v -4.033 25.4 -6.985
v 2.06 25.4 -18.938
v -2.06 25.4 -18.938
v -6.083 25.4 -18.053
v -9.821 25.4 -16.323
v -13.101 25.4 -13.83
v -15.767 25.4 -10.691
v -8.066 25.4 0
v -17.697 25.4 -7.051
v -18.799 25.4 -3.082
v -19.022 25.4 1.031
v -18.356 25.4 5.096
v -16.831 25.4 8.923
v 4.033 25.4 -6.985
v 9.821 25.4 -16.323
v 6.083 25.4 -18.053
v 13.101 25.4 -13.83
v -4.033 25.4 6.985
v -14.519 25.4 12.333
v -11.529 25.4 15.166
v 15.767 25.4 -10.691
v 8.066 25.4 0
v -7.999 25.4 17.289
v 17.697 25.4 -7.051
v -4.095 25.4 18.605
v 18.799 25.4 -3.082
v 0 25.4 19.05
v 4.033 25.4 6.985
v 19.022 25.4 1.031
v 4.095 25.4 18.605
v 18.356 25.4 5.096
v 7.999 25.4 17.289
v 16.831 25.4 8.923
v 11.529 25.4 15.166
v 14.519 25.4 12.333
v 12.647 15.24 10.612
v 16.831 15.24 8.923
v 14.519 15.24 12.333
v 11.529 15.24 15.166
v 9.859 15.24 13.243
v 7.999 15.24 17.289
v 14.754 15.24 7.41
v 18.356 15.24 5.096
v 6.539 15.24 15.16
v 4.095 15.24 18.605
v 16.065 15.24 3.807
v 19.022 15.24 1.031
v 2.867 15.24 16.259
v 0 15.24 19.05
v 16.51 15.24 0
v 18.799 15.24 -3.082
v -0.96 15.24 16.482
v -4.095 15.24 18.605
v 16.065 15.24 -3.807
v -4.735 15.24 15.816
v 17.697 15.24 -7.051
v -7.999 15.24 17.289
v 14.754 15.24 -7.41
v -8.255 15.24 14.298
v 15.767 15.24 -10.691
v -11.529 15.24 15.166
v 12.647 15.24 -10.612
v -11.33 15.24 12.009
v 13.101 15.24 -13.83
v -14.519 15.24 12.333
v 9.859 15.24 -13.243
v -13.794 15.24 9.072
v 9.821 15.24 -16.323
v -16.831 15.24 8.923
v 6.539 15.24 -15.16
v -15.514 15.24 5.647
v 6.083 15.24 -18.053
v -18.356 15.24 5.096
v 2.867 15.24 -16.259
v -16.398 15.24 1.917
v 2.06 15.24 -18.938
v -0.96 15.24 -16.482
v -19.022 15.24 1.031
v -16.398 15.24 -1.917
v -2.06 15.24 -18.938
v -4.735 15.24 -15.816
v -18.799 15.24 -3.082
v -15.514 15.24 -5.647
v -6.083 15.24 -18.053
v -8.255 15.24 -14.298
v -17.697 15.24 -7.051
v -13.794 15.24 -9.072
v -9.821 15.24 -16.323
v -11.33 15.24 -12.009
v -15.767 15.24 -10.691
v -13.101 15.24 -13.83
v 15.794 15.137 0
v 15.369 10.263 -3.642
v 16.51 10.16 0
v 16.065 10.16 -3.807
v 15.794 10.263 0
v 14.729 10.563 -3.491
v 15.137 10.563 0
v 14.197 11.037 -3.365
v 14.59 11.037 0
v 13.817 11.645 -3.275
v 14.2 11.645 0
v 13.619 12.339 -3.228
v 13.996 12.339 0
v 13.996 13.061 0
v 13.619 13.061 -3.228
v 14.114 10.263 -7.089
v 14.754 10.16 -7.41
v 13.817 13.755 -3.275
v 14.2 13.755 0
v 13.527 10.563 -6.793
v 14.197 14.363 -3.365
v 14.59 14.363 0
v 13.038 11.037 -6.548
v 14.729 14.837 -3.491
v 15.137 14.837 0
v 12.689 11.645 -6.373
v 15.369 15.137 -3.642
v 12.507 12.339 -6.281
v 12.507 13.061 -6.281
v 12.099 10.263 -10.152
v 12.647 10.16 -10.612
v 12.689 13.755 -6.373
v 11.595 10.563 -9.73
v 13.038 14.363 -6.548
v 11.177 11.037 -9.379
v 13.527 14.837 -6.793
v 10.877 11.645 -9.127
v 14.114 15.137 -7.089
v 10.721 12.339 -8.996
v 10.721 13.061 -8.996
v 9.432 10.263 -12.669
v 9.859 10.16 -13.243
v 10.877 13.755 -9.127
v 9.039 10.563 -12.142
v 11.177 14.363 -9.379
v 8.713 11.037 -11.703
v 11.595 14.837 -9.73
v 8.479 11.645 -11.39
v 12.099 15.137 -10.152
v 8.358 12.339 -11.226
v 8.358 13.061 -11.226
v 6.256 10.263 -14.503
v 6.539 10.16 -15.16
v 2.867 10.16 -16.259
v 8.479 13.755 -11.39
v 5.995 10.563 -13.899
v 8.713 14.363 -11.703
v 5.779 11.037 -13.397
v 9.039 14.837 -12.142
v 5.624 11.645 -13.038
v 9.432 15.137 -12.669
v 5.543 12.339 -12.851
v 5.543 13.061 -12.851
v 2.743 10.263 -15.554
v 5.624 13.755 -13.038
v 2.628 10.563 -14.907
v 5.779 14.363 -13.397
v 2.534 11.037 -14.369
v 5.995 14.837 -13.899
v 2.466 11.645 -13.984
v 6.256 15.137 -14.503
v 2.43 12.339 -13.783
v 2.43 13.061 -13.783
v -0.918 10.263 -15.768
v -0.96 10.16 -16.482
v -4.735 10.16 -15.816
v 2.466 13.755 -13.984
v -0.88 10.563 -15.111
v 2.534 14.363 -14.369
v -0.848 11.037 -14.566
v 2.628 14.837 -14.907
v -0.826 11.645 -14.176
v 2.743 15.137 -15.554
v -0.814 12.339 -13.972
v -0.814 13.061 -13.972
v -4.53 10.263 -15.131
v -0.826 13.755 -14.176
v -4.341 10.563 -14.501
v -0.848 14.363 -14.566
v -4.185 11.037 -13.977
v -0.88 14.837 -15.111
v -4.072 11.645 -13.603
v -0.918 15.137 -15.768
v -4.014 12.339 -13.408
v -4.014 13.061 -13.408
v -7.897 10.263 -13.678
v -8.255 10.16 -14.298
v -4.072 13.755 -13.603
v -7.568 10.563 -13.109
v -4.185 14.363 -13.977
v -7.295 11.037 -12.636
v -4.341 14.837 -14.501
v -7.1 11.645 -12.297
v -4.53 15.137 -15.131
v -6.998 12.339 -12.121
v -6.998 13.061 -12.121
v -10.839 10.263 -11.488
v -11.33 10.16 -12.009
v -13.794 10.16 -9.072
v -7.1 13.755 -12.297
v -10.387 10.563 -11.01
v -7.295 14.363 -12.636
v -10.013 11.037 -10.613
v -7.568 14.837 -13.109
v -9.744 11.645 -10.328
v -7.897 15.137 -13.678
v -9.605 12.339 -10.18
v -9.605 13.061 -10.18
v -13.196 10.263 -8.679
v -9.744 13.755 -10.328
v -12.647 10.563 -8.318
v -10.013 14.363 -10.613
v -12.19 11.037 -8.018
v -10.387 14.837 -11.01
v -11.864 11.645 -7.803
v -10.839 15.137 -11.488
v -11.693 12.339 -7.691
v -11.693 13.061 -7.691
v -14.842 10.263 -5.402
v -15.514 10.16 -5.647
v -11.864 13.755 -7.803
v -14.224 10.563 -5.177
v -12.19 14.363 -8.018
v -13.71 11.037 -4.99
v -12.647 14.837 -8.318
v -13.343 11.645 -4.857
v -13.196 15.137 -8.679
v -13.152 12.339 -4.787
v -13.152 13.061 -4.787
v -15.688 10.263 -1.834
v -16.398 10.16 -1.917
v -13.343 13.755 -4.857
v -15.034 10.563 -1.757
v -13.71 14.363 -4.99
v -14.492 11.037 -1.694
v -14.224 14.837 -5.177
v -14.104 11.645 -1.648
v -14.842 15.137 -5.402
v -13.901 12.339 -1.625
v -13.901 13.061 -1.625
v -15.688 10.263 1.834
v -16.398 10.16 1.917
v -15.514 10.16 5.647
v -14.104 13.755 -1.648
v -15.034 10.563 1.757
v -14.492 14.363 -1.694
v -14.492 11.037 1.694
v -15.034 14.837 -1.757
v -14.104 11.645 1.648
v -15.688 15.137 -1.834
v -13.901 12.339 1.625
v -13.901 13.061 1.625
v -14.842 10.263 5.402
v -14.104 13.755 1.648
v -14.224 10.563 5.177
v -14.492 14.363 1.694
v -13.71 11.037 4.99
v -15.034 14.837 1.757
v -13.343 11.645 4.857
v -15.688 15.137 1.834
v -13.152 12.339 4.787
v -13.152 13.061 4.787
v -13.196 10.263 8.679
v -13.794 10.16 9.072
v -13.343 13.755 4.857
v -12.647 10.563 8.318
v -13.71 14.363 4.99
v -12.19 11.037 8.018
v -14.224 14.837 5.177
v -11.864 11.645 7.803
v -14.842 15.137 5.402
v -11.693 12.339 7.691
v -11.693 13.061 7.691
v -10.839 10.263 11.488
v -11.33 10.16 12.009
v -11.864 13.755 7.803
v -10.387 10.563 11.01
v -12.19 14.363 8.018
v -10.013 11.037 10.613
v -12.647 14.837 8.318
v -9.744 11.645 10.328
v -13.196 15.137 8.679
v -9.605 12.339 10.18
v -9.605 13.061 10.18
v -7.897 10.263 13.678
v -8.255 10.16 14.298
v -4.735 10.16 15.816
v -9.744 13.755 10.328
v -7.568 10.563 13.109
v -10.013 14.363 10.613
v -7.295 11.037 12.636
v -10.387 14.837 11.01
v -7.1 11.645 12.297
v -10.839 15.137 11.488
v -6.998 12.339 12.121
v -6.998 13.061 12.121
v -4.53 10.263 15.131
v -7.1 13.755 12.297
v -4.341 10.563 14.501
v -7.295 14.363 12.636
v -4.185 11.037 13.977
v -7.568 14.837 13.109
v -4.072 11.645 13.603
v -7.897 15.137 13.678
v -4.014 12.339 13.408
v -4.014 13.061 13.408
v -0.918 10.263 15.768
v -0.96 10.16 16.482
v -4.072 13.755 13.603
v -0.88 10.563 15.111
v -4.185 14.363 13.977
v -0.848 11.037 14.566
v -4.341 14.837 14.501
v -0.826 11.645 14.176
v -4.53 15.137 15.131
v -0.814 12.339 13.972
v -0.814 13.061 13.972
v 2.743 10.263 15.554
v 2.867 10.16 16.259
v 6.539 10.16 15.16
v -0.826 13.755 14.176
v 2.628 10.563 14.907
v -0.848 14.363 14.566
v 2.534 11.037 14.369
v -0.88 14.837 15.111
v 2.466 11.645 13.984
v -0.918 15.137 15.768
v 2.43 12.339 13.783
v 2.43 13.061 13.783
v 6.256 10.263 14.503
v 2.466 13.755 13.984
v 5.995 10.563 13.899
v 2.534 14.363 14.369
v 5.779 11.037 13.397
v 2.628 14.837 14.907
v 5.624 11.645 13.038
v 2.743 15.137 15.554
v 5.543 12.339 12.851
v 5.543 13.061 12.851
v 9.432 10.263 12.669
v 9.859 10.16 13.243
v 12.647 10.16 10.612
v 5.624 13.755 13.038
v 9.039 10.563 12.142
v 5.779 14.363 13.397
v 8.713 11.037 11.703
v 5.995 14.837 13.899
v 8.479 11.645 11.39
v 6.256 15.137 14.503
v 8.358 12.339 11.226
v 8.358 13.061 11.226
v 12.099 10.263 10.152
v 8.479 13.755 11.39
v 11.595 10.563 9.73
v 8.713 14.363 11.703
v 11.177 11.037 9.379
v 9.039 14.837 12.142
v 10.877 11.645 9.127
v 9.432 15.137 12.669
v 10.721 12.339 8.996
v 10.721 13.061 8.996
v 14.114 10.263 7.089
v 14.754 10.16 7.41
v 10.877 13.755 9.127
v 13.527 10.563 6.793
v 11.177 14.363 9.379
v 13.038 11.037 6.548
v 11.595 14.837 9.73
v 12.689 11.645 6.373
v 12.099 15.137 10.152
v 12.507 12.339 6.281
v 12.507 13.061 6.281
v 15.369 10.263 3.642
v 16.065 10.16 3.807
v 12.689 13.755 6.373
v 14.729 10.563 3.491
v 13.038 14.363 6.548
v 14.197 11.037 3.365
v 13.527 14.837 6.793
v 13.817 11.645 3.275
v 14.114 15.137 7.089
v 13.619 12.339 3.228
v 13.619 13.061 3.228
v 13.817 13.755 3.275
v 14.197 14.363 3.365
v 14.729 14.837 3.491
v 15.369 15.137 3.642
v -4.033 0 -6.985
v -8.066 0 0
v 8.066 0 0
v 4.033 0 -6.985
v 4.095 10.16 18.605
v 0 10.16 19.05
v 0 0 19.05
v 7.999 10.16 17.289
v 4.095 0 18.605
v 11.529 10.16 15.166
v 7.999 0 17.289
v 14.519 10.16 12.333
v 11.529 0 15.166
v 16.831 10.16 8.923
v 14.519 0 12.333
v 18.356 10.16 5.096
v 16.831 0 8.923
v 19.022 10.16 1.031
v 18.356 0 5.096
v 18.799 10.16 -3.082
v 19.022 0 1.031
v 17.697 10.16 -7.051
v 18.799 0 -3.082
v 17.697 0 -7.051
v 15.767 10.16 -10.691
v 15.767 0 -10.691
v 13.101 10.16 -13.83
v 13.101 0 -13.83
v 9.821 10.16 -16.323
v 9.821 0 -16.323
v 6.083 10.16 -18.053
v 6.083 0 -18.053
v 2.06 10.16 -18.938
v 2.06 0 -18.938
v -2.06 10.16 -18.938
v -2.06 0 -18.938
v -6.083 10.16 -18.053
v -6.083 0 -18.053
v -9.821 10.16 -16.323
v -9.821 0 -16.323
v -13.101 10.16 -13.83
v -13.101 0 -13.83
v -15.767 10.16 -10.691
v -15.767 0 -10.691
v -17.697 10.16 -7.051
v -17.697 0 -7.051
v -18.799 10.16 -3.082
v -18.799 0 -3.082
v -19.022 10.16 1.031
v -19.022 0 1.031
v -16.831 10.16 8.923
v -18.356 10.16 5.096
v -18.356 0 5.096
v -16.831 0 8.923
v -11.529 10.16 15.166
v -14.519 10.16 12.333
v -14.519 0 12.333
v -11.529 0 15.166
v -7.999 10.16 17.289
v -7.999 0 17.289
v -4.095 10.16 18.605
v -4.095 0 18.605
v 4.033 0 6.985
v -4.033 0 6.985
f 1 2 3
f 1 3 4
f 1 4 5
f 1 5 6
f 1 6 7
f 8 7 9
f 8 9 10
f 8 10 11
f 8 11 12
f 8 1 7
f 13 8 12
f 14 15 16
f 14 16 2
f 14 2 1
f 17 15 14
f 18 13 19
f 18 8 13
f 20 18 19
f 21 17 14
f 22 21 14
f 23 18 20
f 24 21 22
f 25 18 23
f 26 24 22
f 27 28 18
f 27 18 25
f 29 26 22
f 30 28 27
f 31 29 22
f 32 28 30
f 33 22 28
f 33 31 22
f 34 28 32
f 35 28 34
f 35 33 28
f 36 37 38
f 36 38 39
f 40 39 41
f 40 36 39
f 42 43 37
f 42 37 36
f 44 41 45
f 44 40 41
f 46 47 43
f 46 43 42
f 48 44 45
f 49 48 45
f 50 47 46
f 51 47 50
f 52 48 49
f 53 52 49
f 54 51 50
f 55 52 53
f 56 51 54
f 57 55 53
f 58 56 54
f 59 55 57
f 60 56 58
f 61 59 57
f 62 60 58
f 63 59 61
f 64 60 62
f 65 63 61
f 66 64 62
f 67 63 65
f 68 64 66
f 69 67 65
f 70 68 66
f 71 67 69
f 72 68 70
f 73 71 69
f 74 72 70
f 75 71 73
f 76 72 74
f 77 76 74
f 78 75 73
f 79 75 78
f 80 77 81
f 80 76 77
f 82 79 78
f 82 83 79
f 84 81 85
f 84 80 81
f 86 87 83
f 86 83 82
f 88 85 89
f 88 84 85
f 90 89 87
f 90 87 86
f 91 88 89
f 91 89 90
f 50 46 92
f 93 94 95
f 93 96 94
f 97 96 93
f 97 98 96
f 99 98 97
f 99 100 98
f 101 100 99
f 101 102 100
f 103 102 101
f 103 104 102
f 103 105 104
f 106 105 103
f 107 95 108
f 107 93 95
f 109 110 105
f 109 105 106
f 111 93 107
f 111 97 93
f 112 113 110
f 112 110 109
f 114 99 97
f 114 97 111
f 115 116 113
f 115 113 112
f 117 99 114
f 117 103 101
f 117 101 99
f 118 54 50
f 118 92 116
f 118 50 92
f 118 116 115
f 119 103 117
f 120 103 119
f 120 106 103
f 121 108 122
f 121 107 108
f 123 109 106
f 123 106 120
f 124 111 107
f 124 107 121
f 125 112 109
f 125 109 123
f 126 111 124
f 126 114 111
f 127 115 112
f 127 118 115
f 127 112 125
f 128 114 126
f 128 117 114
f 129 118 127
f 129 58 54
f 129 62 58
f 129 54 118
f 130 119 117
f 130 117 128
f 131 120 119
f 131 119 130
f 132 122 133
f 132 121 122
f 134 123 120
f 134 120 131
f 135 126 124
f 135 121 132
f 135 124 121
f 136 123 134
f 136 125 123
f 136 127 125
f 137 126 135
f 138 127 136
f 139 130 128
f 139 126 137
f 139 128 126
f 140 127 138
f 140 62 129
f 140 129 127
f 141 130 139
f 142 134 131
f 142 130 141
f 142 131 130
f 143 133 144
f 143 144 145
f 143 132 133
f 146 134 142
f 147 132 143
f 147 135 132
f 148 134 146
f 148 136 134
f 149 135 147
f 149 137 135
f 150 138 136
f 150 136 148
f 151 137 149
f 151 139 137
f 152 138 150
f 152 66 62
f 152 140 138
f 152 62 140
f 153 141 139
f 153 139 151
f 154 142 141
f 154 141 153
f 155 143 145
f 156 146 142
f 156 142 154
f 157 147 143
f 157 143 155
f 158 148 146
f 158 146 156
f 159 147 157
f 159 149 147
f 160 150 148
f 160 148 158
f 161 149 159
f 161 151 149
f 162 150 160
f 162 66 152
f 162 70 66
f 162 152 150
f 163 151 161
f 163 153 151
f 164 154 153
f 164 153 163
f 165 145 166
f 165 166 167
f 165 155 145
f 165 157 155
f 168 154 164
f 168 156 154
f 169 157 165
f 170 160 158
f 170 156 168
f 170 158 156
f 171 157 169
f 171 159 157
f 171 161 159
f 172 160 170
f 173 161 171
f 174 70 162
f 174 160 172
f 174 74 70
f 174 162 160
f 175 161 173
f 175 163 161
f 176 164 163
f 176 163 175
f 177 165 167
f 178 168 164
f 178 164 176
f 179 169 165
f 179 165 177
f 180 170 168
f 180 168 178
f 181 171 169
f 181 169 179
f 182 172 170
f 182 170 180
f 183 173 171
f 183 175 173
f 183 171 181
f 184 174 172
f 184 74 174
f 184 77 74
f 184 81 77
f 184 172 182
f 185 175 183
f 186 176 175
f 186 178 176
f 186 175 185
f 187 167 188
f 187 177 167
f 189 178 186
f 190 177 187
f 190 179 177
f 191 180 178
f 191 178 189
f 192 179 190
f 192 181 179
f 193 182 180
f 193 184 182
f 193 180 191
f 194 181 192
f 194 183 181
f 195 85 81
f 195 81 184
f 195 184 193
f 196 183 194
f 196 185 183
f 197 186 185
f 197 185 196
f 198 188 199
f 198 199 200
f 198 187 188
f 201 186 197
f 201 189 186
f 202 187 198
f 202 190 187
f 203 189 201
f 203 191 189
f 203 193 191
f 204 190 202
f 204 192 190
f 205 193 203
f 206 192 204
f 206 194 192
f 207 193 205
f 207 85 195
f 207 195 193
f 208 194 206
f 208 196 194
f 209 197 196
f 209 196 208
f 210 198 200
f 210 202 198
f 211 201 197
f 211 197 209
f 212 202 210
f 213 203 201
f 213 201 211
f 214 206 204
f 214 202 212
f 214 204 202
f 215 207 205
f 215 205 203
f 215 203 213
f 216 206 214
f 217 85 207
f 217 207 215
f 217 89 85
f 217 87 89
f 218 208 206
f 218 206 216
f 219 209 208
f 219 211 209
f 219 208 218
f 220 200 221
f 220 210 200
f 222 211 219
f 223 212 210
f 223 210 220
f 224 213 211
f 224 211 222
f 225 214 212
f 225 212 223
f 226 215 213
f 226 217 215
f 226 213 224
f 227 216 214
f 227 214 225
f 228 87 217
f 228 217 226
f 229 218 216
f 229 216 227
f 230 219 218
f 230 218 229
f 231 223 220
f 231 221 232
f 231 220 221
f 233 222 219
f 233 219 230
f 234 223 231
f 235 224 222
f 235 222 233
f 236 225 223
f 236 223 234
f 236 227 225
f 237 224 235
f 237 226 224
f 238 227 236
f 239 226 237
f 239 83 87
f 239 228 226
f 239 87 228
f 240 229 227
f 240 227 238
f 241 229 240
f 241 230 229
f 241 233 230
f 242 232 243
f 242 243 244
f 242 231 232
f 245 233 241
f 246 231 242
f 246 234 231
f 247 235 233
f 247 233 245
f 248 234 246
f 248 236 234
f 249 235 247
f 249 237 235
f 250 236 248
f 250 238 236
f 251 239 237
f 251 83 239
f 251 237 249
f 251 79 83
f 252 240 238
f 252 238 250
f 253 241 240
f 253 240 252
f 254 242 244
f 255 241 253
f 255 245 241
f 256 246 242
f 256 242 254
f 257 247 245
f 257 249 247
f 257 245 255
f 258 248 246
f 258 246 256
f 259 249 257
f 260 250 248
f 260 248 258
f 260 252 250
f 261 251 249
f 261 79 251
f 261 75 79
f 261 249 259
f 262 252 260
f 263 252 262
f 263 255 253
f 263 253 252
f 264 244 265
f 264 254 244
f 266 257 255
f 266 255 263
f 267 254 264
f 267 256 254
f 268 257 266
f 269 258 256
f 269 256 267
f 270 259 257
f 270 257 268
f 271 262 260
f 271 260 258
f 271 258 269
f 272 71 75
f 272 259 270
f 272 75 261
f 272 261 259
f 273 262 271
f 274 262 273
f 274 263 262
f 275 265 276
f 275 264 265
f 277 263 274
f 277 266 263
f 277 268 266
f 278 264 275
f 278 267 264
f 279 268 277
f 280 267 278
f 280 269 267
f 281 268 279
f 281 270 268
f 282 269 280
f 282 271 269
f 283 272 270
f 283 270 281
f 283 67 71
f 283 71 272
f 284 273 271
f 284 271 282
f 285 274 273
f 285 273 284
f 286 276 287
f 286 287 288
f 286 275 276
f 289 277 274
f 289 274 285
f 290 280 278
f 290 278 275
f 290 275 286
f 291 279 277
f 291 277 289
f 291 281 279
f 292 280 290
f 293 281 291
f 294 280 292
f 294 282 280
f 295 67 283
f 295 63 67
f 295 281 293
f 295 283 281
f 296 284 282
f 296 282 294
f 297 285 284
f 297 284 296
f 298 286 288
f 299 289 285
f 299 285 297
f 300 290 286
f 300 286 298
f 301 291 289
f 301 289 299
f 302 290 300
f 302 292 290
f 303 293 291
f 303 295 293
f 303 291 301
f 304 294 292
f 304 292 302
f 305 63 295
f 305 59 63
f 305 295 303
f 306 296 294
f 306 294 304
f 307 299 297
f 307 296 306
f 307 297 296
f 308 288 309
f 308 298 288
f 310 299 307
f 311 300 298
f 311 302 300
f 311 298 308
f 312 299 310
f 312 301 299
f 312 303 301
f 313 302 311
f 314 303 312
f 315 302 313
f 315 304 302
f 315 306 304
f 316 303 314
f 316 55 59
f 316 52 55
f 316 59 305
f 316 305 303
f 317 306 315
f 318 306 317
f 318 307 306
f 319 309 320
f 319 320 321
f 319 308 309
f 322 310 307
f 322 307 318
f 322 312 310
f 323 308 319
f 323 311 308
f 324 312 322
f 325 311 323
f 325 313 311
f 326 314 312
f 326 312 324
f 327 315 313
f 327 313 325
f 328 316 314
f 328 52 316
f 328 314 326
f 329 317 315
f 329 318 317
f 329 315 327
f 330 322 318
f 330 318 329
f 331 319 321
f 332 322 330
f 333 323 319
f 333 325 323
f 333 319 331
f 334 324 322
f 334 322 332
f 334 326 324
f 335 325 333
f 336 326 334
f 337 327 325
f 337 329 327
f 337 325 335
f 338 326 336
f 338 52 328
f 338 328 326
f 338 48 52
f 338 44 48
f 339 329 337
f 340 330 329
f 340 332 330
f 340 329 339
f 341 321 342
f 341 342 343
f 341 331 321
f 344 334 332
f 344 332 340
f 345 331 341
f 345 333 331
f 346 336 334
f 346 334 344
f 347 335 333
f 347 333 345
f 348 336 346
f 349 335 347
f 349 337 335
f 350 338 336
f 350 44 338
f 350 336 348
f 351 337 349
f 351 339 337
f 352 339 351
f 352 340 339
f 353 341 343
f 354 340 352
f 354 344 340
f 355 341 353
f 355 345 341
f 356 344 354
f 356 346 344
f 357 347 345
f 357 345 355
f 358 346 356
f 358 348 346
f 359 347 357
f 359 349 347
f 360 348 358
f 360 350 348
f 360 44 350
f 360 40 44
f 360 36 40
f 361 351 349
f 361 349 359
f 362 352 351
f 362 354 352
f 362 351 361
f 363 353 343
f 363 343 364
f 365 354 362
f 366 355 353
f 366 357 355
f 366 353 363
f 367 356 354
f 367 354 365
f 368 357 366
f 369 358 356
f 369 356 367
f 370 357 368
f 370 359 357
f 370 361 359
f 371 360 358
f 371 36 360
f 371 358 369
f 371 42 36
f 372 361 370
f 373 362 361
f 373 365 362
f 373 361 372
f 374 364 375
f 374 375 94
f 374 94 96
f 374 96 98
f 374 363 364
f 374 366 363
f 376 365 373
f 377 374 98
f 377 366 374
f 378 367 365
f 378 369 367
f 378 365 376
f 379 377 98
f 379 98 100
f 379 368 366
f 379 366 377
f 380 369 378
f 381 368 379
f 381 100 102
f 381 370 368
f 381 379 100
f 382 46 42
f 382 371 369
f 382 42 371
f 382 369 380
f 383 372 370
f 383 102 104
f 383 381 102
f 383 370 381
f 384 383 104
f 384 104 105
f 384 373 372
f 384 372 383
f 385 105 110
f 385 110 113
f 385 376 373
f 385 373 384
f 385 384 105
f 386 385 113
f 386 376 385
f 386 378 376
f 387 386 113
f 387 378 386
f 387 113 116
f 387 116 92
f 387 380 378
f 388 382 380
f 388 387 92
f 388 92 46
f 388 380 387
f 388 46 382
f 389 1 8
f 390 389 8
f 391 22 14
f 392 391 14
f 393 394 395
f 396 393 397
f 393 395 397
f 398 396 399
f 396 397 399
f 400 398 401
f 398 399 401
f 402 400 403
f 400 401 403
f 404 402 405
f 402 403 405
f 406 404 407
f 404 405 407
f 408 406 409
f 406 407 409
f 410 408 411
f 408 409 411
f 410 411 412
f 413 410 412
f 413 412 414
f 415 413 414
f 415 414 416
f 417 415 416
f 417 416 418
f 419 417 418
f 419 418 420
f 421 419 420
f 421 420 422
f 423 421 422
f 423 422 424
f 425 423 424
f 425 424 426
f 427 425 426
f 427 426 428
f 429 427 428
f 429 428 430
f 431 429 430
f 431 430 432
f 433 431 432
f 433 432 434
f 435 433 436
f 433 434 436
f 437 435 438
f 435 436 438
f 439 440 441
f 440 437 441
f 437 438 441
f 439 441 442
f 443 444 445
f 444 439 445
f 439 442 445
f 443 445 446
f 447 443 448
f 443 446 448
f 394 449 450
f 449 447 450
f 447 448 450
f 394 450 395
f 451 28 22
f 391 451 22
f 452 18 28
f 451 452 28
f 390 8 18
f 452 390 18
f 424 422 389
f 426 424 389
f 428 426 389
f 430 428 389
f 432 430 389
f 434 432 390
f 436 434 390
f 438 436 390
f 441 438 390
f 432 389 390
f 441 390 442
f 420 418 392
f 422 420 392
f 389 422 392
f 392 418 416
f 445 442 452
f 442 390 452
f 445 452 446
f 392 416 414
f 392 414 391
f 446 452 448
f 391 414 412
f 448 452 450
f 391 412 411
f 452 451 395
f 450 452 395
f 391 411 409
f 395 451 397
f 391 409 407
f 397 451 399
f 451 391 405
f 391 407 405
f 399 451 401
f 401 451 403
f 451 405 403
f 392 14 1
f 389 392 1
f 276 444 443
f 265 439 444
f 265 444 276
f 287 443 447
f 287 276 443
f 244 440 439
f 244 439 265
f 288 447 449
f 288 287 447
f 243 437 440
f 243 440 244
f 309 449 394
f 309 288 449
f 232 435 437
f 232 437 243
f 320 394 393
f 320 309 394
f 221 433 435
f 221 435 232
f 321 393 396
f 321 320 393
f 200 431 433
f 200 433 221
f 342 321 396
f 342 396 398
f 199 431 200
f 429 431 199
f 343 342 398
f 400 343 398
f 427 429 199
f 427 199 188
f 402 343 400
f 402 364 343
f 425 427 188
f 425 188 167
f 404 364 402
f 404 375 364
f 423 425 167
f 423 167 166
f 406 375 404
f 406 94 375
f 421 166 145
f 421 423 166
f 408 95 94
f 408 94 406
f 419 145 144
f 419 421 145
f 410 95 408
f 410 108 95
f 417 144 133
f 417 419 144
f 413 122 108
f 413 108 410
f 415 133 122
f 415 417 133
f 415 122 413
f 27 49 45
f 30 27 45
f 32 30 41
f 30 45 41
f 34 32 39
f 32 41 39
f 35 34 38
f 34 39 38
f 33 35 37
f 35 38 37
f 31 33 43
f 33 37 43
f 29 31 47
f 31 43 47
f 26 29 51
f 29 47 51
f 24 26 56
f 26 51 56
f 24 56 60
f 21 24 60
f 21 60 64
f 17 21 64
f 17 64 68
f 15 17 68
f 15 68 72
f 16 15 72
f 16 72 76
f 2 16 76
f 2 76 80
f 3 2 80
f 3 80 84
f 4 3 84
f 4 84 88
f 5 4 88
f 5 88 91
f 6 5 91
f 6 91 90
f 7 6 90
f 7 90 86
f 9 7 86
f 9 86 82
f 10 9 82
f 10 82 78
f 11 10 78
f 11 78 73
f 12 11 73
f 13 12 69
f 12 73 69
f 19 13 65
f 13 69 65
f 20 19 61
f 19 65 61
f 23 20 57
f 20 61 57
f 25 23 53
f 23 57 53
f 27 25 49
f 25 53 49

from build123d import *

# Parameters (mm, degrees)
SKETCH2_R           = 19.05
BOSS_EXTRUDE1_DEPTH = 25.4
CUT_EXTRUDE1_DEPTH  = 38.026544532


with BuildPart() as part:
    # Sketch2 → Boss-Extrude1 (new body)
    with BuildSketch(Plane(origin=(0, 0, 0), x_dir=(1, 0, 0), z_dir=(0, 1, 0))):
        with Locations(Location((0, 0, 0), (0, 0, 270))):
            Circle(SKETCH2_R)
    extrude(amount=BOSS_EXTRUDE1_DEPTH)

    # Sketch4 → Cut-Revolve2 (revolve, cut)
    with BuildSketch(Plane.XY, mode=Mode.PRIVATE) as cut_revolve2_sk:
        with BuildLine():
            Line((-16.51, 15.24), (-19.05, 15.24))
            Line((-19.05, 15.24), (-19.05, 10.16))
            Line((-19.05, 10.16), (-16.51, 10.16))
            ThreePointArc((-16.51, 10.16), (-13.97, 12.7), (-16.51, 15.24))
        make_face()
    revolve(cut_revolve2_sk.sketch.rotate(Axis((0, 0, 0), (0, 1, 0)), 180), axis=Axis((0, 0, 0), (0, 1, 0)), mode=Mode.SUBTRACT)

    # Sketch7 → Cut-Extrude1 (cut, through all)
    with BuildSketch(Plane(origin=(0, 25.4, 0), x_dir=(1, 0, 0), z_dir=(0, 1, 0))):
        Polygon((8.065583261, 0), (4.03279163, 6.985), (-4.03279163, 6.985), (-8.065583261, 0), (-4.03279163, -6.985), (4.03279163, -6.985), align=None)
    extrude(amount=-CUT_EXTRUDE1_DEPTH, mode=Mode.SUBTRACT)


solid = part.part
